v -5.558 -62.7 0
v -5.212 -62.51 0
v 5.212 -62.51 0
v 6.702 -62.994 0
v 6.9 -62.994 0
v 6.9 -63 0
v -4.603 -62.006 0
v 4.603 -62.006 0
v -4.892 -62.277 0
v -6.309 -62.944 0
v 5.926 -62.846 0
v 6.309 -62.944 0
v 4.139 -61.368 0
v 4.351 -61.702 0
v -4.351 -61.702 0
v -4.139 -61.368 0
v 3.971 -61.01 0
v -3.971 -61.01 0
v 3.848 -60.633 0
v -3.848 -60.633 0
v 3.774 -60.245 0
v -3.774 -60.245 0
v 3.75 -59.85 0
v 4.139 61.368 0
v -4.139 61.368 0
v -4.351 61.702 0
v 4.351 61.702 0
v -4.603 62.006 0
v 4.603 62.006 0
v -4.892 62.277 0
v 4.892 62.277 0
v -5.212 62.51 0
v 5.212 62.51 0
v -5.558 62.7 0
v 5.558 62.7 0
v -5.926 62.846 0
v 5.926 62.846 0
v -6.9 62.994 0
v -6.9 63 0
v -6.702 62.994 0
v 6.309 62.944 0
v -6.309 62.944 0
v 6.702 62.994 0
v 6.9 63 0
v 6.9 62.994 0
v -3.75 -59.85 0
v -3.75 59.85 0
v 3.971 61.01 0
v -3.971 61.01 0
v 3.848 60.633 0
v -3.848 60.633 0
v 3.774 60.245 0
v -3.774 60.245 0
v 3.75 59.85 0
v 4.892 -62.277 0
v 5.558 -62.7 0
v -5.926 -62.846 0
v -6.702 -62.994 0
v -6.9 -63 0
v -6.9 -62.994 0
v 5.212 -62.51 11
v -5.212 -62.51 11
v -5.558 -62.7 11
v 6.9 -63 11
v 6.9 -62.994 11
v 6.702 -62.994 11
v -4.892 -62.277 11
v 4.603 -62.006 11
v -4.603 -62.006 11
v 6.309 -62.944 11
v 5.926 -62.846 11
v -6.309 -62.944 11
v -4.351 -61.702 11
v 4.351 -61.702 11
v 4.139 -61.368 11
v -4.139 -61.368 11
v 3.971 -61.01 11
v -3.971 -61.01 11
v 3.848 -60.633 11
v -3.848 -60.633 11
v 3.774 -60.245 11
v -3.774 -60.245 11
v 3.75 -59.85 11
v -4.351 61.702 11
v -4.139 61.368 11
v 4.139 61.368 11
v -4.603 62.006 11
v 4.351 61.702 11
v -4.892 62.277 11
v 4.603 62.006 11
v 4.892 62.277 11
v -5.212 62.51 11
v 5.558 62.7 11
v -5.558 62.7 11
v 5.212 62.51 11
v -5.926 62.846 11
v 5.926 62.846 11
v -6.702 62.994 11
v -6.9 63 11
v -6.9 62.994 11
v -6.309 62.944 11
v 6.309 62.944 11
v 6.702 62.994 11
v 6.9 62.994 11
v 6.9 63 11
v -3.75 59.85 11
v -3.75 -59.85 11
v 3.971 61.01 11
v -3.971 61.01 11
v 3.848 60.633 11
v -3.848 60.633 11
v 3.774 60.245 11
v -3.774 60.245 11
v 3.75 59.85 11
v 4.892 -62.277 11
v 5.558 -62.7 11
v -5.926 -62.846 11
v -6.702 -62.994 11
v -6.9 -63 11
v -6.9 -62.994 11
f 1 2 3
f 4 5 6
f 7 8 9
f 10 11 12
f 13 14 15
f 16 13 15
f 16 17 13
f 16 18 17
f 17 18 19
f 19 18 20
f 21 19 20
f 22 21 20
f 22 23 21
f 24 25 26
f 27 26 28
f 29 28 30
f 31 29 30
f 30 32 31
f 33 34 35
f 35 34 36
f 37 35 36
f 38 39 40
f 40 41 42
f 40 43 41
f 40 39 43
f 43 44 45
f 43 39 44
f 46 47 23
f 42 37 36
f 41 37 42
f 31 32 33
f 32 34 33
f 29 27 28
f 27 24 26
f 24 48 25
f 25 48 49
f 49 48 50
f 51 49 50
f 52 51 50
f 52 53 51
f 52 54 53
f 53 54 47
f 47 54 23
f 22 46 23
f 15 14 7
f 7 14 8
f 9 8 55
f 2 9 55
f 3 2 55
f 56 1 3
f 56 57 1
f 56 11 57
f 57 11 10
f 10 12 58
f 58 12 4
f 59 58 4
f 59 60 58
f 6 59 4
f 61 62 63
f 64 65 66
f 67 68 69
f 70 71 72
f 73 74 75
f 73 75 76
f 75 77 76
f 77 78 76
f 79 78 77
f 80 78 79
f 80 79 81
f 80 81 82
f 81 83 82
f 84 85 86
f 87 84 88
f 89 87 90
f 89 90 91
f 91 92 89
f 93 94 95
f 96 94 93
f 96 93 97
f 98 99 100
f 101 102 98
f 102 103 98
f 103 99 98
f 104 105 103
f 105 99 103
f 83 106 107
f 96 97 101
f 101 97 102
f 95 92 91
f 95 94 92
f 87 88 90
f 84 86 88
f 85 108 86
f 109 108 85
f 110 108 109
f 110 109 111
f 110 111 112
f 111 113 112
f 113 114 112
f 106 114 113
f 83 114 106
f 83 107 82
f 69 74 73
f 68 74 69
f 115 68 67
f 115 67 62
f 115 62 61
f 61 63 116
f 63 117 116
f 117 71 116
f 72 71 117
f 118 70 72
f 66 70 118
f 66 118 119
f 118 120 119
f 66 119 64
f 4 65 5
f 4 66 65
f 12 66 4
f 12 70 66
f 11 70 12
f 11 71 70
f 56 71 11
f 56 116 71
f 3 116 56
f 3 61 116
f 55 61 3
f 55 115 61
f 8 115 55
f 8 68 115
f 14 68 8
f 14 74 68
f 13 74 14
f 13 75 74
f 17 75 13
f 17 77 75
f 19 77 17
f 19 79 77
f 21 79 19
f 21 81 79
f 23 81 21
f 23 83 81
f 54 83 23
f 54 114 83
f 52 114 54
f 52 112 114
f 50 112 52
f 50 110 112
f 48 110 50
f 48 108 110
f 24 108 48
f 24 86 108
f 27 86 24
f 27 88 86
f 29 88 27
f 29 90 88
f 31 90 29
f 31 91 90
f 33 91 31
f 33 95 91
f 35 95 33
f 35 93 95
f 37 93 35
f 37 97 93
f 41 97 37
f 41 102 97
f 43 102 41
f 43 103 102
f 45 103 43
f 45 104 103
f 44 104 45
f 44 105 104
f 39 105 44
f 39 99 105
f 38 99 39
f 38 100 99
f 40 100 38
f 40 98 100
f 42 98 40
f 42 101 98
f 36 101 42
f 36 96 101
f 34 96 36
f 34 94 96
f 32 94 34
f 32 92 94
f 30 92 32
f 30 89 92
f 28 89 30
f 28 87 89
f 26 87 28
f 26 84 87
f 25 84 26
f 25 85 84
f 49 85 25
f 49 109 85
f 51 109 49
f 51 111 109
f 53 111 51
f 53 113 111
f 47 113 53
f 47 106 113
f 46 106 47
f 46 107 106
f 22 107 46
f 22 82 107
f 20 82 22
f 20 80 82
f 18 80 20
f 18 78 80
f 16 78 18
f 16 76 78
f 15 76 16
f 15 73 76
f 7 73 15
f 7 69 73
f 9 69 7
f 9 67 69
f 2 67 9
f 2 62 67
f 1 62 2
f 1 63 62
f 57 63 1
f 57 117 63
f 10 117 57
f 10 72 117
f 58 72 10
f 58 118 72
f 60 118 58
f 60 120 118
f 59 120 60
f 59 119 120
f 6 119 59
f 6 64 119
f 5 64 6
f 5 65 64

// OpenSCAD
$fn=50;

arc_d=6.3;

size = [7.5 + arc_d, 126];
size2 = [size.x + 4, size.y + 15];
height=11;

linear_extrude(height=height)
box(size);

*translate([0, 0, height])
linear_extrude(height=2)
box(size2);


module box(size) {
    difference() {
        square(size, center=true);
        translate([size.x/2, 0])
        cut();
        translate([-size.x/2, 0])
        cut();
    }
}

module cut() {
    minkowski() {
        circle(d=arc_d);
        square([0.001, size.y-arc_d], center=true);
    }
}
